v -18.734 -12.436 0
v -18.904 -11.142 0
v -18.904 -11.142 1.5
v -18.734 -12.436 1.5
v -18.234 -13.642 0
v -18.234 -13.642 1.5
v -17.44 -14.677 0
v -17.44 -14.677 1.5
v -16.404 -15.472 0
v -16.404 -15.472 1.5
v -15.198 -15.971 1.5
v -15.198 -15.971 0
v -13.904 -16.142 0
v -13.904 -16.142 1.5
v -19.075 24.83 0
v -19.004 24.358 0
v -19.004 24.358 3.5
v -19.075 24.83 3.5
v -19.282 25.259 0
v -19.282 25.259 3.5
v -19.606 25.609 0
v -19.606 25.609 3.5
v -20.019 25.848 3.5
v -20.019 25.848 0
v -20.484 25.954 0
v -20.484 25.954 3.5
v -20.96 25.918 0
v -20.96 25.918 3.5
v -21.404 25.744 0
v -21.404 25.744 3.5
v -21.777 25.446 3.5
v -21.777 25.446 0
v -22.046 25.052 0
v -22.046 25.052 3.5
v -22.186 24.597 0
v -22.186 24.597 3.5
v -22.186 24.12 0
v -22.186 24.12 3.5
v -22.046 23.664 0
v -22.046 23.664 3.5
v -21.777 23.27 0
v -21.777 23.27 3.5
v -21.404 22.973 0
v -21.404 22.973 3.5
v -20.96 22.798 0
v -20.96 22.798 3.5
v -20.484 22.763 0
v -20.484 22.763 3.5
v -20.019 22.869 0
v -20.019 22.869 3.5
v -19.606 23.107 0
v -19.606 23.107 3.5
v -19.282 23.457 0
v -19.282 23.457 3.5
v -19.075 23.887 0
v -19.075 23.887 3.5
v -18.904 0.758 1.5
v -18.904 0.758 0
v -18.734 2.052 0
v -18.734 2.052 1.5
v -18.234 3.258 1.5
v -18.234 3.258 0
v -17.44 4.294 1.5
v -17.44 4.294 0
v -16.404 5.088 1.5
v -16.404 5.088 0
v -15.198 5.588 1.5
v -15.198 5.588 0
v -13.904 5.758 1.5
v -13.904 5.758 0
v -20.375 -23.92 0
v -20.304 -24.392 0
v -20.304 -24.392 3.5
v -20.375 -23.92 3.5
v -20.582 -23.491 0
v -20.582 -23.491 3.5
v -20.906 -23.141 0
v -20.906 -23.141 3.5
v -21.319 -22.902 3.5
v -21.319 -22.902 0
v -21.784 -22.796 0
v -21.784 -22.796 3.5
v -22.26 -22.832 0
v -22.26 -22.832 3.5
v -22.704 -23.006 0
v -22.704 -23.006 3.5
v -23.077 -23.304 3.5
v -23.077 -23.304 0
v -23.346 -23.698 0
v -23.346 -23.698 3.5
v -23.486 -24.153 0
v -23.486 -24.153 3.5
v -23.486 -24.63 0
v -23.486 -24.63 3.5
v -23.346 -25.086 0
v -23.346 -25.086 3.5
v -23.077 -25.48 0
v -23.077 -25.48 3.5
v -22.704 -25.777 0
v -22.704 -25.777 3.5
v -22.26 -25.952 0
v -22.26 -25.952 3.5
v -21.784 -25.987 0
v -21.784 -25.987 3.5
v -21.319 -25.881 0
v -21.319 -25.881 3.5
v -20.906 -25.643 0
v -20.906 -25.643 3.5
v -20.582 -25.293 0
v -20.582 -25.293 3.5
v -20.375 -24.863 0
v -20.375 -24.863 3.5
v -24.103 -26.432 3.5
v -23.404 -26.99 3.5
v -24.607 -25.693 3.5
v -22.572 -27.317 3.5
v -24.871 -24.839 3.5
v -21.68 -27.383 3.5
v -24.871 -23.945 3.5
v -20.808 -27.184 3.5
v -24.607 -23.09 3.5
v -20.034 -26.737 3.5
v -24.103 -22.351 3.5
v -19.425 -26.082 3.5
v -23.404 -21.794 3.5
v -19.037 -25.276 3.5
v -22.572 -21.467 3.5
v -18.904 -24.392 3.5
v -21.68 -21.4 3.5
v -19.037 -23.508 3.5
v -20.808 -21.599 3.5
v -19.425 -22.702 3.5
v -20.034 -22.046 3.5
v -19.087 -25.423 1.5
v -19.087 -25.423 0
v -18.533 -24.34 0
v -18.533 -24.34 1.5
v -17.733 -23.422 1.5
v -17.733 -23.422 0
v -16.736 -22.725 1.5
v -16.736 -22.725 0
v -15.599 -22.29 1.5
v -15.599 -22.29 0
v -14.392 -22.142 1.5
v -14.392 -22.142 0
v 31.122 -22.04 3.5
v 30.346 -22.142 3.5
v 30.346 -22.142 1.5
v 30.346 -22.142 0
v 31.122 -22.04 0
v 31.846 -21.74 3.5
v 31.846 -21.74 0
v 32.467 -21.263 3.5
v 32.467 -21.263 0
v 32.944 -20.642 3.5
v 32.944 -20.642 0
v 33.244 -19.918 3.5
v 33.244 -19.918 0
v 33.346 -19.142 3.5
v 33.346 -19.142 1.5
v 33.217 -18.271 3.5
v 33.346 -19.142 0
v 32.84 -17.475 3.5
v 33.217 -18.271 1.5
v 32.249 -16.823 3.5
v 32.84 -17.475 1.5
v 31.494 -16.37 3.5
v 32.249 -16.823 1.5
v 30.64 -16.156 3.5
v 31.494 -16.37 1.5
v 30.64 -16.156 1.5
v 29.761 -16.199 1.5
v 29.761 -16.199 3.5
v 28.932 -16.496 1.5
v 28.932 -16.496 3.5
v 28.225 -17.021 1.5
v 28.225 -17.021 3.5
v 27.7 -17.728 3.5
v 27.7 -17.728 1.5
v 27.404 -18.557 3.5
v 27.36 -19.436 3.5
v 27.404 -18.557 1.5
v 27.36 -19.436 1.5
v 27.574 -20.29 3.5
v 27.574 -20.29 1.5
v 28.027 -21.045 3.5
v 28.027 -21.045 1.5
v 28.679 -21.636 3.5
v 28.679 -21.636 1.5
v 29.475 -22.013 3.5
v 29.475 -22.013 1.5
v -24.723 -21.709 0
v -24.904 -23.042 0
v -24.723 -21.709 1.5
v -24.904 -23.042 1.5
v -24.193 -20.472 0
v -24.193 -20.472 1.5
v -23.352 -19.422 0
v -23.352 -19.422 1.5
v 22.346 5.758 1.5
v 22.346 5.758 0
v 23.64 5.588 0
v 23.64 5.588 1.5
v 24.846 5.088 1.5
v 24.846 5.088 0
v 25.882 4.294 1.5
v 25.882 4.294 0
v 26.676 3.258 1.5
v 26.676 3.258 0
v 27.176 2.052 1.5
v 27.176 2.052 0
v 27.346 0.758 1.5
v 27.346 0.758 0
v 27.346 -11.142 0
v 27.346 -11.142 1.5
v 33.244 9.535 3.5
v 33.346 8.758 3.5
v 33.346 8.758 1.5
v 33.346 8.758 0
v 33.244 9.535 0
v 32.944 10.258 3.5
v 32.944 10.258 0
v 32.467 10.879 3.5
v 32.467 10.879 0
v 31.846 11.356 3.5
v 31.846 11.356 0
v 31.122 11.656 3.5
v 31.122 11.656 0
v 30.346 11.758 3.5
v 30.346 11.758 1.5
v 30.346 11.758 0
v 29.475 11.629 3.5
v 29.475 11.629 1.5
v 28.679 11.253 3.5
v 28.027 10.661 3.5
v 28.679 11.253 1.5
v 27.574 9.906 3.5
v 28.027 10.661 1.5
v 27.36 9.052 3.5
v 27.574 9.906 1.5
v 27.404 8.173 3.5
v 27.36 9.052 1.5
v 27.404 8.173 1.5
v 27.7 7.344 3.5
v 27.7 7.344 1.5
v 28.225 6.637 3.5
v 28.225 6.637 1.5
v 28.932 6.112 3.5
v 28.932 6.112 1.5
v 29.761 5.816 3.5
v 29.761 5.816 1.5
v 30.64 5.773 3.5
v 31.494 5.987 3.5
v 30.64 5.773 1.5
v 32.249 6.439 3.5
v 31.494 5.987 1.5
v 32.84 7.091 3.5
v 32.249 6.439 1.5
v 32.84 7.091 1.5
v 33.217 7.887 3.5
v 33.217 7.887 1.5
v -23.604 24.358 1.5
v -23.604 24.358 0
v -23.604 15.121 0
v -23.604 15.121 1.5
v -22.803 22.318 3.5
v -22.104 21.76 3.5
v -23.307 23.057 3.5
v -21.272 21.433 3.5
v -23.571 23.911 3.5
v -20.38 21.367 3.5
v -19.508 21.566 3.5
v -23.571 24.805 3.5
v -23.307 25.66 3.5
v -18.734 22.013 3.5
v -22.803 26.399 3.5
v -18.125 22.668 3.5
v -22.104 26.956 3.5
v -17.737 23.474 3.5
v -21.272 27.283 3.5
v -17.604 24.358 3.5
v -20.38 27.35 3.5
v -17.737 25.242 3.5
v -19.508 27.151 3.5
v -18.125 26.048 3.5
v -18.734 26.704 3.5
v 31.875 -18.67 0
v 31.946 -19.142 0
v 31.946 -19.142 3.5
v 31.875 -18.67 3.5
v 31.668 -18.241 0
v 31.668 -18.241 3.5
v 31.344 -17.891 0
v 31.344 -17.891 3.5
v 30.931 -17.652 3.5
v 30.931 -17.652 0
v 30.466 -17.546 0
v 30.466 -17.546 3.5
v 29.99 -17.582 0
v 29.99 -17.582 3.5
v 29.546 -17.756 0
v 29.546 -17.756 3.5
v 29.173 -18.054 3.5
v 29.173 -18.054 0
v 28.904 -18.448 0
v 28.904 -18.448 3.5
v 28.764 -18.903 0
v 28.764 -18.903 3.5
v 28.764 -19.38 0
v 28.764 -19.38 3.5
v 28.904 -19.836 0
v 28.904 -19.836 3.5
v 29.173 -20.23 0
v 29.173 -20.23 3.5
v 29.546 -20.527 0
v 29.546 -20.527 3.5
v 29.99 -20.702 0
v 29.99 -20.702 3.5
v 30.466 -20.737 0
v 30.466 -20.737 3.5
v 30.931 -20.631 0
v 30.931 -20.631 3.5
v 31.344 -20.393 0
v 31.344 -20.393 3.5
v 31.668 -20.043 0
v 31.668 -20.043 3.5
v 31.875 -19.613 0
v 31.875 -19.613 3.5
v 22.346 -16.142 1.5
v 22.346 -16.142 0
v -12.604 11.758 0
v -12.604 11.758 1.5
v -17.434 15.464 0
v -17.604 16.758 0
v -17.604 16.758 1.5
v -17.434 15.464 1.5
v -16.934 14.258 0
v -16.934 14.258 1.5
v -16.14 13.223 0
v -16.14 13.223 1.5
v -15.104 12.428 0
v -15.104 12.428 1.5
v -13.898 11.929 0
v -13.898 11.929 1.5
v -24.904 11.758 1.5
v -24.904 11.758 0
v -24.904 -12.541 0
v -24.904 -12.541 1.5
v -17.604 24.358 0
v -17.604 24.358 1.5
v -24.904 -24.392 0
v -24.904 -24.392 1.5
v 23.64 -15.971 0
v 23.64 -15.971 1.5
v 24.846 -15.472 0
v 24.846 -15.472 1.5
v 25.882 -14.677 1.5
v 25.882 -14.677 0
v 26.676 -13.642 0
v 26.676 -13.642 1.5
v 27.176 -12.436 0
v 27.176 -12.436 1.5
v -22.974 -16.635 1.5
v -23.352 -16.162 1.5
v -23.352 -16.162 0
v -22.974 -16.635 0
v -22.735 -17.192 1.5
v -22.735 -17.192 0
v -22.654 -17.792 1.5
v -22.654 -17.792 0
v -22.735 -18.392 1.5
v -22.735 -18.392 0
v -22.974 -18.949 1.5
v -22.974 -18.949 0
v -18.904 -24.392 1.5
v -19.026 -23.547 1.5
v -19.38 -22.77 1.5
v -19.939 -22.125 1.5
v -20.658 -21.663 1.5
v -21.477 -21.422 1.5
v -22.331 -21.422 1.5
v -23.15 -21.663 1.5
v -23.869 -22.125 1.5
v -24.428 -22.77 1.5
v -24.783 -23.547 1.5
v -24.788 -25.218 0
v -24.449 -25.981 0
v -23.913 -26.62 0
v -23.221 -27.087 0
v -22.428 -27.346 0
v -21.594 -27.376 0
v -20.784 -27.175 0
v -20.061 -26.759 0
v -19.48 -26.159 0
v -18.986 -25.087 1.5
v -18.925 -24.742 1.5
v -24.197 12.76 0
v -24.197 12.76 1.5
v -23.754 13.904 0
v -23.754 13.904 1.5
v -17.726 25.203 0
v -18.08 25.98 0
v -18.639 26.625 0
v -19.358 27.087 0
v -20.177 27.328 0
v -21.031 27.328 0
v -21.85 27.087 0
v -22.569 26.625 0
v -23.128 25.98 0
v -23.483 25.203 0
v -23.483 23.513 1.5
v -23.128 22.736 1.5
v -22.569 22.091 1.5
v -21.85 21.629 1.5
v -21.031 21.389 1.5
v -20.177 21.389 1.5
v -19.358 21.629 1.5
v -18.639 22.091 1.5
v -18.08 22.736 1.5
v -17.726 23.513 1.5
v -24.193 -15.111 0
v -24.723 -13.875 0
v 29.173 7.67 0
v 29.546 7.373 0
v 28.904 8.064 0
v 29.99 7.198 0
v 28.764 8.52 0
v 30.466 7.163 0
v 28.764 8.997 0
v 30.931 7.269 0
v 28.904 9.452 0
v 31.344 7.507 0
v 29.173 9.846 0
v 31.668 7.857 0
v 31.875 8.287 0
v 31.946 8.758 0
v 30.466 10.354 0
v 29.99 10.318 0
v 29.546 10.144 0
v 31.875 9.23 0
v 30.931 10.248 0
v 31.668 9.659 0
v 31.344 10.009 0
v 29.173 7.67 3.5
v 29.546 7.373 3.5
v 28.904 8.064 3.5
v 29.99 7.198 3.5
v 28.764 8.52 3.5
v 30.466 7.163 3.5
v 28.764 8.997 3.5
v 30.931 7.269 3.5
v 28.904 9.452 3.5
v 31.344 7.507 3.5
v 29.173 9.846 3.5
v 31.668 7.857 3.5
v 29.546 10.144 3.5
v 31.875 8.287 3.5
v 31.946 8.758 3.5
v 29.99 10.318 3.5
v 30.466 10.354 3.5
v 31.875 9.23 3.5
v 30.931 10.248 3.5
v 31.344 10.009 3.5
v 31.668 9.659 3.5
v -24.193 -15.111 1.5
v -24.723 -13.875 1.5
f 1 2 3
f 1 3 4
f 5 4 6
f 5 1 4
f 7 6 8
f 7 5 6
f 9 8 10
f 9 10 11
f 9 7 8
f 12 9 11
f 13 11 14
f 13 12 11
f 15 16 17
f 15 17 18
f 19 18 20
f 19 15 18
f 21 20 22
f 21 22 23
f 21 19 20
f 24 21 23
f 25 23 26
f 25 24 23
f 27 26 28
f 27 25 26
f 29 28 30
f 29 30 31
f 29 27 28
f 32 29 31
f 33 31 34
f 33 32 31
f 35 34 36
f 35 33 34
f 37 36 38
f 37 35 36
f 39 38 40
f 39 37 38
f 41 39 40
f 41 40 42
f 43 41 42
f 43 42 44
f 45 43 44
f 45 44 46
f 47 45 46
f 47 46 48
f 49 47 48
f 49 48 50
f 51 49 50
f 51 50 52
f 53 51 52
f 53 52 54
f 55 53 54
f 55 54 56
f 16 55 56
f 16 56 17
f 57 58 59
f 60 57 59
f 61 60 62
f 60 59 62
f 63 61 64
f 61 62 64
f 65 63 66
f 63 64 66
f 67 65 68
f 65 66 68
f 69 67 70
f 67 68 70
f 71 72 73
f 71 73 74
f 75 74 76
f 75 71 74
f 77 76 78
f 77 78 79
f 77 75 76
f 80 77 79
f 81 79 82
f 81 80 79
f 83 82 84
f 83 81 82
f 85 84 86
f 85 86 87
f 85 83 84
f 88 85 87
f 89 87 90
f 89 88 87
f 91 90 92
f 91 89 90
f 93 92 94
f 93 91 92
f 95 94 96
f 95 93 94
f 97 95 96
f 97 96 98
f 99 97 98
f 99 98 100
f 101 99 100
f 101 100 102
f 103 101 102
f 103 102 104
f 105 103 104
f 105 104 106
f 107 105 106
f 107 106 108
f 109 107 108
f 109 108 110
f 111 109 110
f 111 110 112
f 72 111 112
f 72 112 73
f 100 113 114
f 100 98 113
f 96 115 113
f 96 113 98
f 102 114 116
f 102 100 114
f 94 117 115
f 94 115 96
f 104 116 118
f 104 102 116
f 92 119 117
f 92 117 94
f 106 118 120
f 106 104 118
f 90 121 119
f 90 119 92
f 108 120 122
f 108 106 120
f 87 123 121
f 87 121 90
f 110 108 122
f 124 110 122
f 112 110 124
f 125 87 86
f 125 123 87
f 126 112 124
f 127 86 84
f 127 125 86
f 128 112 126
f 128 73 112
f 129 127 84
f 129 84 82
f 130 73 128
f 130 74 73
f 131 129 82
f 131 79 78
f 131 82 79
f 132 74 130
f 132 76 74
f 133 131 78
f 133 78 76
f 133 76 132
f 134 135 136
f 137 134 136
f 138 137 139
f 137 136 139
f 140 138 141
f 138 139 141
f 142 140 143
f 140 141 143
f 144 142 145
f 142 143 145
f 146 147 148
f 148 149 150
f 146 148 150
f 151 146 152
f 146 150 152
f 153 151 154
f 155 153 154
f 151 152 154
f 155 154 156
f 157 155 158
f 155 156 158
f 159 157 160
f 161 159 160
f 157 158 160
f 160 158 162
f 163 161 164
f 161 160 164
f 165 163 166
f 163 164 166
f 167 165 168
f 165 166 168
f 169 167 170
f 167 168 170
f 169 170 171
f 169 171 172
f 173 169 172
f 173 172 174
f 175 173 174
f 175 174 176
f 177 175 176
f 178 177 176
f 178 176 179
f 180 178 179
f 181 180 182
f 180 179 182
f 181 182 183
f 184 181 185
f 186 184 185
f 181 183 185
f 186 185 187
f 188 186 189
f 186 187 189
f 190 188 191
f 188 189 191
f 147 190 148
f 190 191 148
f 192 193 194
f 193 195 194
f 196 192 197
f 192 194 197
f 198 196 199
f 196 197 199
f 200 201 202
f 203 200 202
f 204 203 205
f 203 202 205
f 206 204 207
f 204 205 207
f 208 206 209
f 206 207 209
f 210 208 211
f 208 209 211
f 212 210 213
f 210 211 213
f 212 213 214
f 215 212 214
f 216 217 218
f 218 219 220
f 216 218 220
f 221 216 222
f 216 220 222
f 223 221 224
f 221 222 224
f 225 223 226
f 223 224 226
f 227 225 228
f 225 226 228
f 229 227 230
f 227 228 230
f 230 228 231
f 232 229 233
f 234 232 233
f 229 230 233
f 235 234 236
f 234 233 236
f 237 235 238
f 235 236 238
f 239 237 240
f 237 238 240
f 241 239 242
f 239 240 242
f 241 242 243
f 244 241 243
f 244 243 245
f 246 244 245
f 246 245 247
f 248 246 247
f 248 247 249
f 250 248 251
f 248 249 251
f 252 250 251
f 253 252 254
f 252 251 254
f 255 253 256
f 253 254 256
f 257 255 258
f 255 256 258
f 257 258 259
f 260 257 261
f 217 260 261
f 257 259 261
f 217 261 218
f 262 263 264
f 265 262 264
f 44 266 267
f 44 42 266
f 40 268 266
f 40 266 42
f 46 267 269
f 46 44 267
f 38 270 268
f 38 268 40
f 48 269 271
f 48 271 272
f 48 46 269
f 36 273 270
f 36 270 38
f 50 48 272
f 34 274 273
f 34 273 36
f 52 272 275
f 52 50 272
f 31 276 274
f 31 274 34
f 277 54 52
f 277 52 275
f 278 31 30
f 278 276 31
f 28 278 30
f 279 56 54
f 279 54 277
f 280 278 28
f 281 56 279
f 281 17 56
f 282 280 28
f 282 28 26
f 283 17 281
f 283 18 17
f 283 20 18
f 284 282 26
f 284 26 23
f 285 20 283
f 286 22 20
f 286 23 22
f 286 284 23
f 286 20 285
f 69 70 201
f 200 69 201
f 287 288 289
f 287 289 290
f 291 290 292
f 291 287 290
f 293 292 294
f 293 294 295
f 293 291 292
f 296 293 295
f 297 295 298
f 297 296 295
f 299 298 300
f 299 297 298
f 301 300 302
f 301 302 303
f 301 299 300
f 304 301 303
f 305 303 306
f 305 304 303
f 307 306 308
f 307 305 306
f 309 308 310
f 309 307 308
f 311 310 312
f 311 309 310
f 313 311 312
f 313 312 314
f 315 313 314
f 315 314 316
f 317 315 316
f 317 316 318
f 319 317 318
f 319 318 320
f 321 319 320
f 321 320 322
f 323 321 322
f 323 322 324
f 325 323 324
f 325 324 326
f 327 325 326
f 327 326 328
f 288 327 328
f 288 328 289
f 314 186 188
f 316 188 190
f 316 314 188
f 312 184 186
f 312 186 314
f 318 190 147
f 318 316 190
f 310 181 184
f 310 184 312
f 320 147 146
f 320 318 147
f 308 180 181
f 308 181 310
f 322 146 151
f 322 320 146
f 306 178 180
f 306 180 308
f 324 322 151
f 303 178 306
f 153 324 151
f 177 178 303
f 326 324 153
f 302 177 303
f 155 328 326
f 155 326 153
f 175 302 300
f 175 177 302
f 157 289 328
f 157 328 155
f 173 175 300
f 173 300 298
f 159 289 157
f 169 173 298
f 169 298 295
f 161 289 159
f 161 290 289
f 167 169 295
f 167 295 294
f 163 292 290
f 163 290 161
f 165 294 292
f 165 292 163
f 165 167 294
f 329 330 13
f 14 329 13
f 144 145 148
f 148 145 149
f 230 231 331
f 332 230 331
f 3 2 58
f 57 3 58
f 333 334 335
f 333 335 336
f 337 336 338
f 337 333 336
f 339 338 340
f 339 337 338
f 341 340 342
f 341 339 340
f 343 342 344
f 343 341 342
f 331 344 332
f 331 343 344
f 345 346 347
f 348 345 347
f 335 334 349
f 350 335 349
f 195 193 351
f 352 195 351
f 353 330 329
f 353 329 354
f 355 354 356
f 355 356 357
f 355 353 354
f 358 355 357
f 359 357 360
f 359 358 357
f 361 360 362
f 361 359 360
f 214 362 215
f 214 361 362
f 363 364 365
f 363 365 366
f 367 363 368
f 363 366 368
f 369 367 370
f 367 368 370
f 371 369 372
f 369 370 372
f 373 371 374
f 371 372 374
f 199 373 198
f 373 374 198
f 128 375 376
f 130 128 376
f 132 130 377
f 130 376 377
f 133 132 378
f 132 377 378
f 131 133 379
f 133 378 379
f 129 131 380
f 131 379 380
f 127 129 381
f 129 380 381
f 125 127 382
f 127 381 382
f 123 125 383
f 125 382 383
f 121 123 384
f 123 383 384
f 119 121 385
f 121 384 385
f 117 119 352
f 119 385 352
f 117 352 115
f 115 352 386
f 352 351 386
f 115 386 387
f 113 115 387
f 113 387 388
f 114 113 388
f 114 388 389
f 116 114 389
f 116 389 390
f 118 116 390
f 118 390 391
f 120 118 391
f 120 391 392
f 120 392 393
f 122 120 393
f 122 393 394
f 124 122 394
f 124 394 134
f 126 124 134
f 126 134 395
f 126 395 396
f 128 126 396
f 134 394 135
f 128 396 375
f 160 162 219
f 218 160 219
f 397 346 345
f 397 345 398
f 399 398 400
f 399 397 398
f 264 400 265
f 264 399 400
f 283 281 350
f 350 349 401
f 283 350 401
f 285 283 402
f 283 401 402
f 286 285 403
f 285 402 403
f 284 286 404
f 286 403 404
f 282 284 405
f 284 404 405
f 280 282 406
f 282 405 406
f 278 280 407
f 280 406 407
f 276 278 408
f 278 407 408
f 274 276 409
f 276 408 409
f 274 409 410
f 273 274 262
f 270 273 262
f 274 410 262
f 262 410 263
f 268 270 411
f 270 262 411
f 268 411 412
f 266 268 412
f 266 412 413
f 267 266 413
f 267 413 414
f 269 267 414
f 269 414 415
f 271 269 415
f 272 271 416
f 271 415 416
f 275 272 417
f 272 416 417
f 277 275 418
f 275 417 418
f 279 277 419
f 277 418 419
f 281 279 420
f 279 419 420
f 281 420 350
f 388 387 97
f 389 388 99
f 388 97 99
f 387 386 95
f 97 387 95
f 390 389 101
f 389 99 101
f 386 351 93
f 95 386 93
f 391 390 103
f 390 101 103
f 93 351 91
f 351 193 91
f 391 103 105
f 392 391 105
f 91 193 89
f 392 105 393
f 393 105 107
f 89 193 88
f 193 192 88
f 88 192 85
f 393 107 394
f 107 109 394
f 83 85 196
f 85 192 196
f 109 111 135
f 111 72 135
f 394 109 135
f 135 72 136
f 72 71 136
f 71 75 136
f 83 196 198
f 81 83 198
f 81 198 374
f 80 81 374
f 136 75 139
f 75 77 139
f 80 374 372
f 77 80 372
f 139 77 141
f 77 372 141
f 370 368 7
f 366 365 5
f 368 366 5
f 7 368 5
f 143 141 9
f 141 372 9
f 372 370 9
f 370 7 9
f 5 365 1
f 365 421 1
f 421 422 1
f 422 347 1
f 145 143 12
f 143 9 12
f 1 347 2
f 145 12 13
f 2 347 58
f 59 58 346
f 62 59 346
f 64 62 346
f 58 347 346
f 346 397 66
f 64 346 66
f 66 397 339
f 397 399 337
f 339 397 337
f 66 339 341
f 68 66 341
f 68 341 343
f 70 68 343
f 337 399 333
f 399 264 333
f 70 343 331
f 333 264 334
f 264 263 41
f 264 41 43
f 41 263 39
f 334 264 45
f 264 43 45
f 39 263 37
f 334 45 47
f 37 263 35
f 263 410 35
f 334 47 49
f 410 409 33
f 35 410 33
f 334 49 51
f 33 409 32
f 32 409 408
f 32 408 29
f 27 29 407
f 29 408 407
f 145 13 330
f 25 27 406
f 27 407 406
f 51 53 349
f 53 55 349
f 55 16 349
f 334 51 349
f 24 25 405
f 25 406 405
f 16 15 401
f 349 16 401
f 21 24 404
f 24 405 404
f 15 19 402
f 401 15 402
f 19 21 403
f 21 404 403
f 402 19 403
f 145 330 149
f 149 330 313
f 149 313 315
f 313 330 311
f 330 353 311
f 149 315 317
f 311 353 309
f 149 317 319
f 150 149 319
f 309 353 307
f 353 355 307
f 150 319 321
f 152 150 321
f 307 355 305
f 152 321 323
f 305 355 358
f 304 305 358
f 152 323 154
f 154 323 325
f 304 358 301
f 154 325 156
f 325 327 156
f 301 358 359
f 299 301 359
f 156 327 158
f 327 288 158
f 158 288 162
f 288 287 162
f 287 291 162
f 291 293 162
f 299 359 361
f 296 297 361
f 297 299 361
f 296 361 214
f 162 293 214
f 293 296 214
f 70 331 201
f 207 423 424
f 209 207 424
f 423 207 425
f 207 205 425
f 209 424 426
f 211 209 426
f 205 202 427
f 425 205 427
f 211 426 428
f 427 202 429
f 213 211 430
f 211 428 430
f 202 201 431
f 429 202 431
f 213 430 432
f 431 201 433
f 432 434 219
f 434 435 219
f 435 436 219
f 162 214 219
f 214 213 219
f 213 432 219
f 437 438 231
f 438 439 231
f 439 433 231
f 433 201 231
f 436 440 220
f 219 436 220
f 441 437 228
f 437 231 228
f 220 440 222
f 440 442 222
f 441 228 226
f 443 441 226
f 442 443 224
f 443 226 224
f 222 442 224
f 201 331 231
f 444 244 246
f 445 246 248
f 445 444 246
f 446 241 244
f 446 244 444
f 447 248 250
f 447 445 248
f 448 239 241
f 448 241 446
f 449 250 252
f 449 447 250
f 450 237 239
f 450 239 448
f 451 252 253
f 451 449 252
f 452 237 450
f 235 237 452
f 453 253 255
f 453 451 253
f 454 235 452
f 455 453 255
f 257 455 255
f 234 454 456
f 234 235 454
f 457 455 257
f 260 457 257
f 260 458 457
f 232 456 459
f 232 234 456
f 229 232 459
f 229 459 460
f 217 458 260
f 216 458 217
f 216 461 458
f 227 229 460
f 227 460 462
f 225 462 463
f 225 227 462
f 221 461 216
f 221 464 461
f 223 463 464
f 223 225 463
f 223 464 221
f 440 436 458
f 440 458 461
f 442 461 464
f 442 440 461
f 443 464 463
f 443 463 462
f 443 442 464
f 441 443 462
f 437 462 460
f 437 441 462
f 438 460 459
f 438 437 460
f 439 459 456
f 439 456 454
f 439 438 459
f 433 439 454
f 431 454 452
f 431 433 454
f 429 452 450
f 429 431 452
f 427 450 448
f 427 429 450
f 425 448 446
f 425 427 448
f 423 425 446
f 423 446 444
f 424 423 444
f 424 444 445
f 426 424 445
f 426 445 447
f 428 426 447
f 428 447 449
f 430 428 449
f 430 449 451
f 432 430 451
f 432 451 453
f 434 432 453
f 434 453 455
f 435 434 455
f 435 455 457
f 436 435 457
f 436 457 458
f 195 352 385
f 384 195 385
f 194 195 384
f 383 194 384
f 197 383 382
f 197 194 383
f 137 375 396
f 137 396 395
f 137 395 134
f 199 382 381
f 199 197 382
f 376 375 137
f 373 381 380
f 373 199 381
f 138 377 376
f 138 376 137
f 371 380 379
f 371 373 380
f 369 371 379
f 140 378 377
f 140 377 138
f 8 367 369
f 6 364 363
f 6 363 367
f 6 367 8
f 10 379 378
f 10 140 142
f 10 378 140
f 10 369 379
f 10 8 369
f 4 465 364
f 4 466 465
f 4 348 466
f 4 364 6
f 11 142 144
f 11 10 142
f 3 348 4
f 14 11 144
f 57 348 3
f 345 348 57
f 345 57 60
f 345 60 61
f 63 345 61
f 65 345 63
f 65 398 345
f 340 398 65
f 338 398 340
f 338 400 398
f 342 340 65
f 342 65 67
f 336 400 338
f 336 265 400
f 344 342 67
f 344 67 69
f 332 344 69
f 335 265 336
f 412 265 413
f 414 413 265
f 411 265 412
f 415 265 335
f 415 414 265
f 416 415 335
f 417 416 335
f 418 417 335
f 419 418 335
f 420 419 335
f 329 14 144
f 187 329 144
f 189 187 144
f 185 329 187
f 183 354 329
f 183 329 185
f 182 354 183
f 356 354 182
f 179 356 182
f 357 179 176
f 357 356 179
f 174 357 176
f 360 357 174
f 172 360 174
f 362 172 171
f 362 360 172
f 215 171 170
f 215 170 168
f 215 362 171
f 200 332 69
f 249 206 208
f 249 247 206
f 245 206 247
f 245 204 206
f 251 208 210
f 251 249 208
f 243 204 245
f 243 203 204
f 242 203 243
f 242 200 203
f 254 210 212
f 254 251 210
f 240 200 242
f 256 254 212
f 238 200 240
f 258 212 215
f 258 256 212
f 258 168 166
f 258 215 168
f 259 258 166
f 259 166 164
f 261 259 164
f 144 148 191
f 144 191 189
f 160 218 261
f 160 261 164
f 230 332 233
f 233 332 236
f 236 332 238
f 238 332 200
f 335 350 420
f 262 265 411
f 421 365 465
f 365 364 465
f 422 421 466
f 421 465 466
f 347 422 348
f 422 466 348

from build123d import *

# Parameters (mm, degrees)
F0_R        = 1.6
F1_DEPTH    = 1.5
F2_DEPTH    = 3.5
F3_T1_DEPTH = 1.5
F4_R        = 5


# Not quite as in the source:
# - a fillet or chamfer that OpenCascade refuses, or shapes differently, is made with other operations: its cross-section is extruded or revolved along the edge and cut away or added
# - a feature names something its author has since deleted; it is built from what else it names


with BuildPart() as f1:
    # F0 (on Top) → F1 (new body)
    with BuildSketch(Plane.XY):
        with BuildLine():
            Line((-18.9040250808, 5.7581766099), (-18.9040250808, 11.7581766099))
            Line((-18.9040250808, 11.7581766099), (-23.6040250808, 11.7581766099))
            Line((-23.6040250808, 11.7581766099), (-24.9040250808, 11.7581766099))
            Line((-24.9040250808, 11.7581766099), (-24.9040250808, -15.541421883))
            ThreePointArc((-24.9040250808, -15.541421883), (-22.6536235737, -17.7918233901), (-24.9040250808, -20.0422248973))
            Line((-24.9040250808, -20.0422248973), (-24.9040250808, -24.3918233901))
            ThreePointArc((-24.9040250808, -24.3918233901), (-21.9040250808, -21.3918233901), (-18.9040250808, -24.3918233901))
            Line((-18.9040250808, -24.3918233901), (-18.9040250808, -22.1418233901))
            Line((-18.9040250808, -22.1418233901), (-18.9040250808, -16.1418233901))
            Line((-18.9040250808, -16.1418233901), (-18.9040250808, 5.7581766099))
        make_face()
        with BuildLine():
            ThreePointArc((33.3459749192, 8.7581766099), (28.2246545756, 6.6368562663), (30.3459749192, 11.7581766099))
            Line((30.3459749192, 11.7581766099), (-17.6040250808, 11.7581766099))
            Line((-17.6040250808, 11.7581766099), (-18.9040250808, 11.7581766099))
            Line((-18.9040250808, 11.7581766099), (-18.9040250808, 5.7581766099))
            Line((-18.9040250808, 5.7581766099), (27.3459749192, 5.7581766099))
            Line((27.3459749192, 5.7581766099), (27.3459749192, -16.1418233901))
            Line((27.3459749192, -16.1418233901), (-18.9040250808, -16.1418233901))
            Line((-18.9040250808, -16.1418233901), (-18.9040250808, -22.1418233901))
            Line((-18.9040250808, -22.1418233901), (30.3459749192, -22.1418233901))
            ThreePointArc((30.3459749192, -22.1418233901), (28.2246545756, -17.0205030466), (33.3459749192, -19.1418233901))
            Line((33.3459749192, -19.1418233901), (33.3459749192, 8.7581766099))
        make_face()
        with BuildLine():
            ThreePointArc((-24.9040250808, -24.3918233901), (-21.9040250808, -27.3918233901), (-18.9040250808, -24.3918233901))
            ThreePointArc((-18.9040250808, -24.3918233901), (-21.9040250808, -21.3918233901), (-24.9040250808, -24.3918233901))
        make_face()
        with Locations((-21.9040250808, -24.3918233901)):
            Circle(F0_R, mode=Mode.SUBTRACT)
        with BuildLine():
            ThreePointArc((30.3459749192, -22.1418233901), (32.4672952628, -21.2631437337), (33.3459749192, -19.1418233901))
            ThreePointArc((33.3459749192, -19.1418233901), (28.2246545756, -17.0205030466), (30.3459749192, -22.1418233901))
        make_face()
        with Locations((30.3459749192, -19.1418233901)):
            Circle(F0_R, mode=Mode.SUBTRACT)
        with BuildLine():
            ThreePointArc((33.3459749192, 8.7581766099), (32.4672952628, 10.8794969534), (30.3459749192, 11.7581766099))
            ThreePointArc((30.3459749192, 11.7581766099), (28.2246545756, 6.6368562663), (33.3459749192, 8.7581766099))
        make_face()
        with Locations((30.3459749192, 8.7581766099)):
            Circle(F0_R, mode=Mode.SUBTRACT)
        with BuildLine():
            Line((-18.9040250808, 11.7581766099), (-17.6040250808, 11.7581766099))
            Line((-17.6040250808, 11.7581766099), (-17.6040250808, 24.3581766099))
            ThreePointArc((-17.6040250808, 24.3581766099), (-20.6040250808, 21.3581766099), (-23.6040250808, 24.3581766099))
            Line((-23.6040250808, 24.3581766099), (-23.6040250808, 11.7581766099))
            Line((-23.6040250808, 11.7581766099), (-18.9040250808, 11.7581766099))
        make_face()
        with BuildLine():
            ThreePointArc((-23.6040250808, 24.3581766099), (-20.6040250808, 21.3581766099), (-17.6040250808, 24.3581766099))
            ThreePointArc((-17.6040250808, 24.3581766099), (-20.6040250808, 27.3581766099), (-23.6040250808, 24.3581766099))
        make_face()
        with Locations((-20.6040250808, 24.3581766099)):
            Circle(F0_R, mode=Mode.SUBTRACT)
    extrude(amount=F1_DEPTH)

    # F0 (on Top) → F2 (join)
    with BuildSketch(Plane.XY):
        with BuildLine():
            ThreePointArc((-24.9040250808, -24.3918233901), (-21.9040250808, -27.3918233901), (-18.9040250808, -24.3918233901))
            ThreePointArc((-18.9040250808, -24.3918233901), (-21.9040250808, -21.3918233901), (-24.9040250808, -24.3918233901))
        make_face()
        with Locations((-21.9040250808, -24.3918233901)):
            Circle(F0_R, mode=Mode.SUBTRACT)
        with BuildLine():
            ThreePointArc((33.3459749192, 8.7581766099), (32.4672952628, 10.8794969534), (30.3459749192, 11.7581766099))
            ThreePointArc((30.3459749192, 11.7581766099), (28.2246545756, 6.6368562663), (33.3459749192, 8.7581766099))
        make_face()
        with Locations((30.3459749192, 8.7581766099)):
            Circle(F0_R, mode=Mode.SUBTRACT)
        with BuildLine():
            ThreePointArc((30.3459749192, -22.1418233901), (32.4672952628, -21.2631437337), (33.3459749192, -19.1418233901))
            ThreePointArc((33.3459749192, -19.1418233901), (28.2246545756, -17.0205030466), (30.3459749192, -22.1418233901))
        make_face()
        with Locations((30.3459749192, -19.1418233901)):
            Circle(F0_R, mode=Mode.SUBTRACT)
        with BuildLine():
            ThreePointArc((-23.6040250808, 24.3581766099), (-20.6040250808, 21.3581766099), (-17.6040250808, 24.3581766099))
            ThreePointArc((-17.6040250808, 24.3581766099), (-20.6040250808, 27.3581766099), (-23.6040250808, 24.3581766099))
        make_face()
        with Locations((-20.6040250808, 24.3581766099)):
            Circle(F0_R, mode=Mode.SUBTRACT)
    extrude(amount=F2_DEPTH)

    # F3: fillet of radius 5 on 7 edges, made by hand

    # F3_s2 → F3_t1 (join)
    with BuildSketch(Plane.XY):
        with BuildLine():
            ThreePointArc((-18.9040250808, 0.7581766099), (-17.4395589867, 4.2937105158), (-13.9040250808, 5.7581766099))
            Line((-13.9040250808, 5.7581766099), (-18.9040250808, 5.7581766099))
            Line((-18.9040250808, 5.7581766099), (-18.9040250808, 0.7581766099))
        make_face()
        with BuildLine():
            ThreePointArc((-18.9040250808, -11.1418233901), (-17.4395589867, -14.6773572961), (-13.9040250808, -16.1418233901))
            Line((-13.9040250808, -16.1418233901), (-18.9040250808, -16.1418233901))
            Line((-18.9040250808, -16.1418233901), (-18.9040250808, -11.1418233901))
        make_face()
        with BuildLine():
            ThreePointArc((22.3459749192, 5.7581766099), (25.8815088251, 4.2937105158), (27.3459749192, 0.7581766099))
            Line((27.3459749192, 0.7581766099), (27.3459749192, 5.7581766099))
            Line((27.3459749192, 5.7581766099), (22.3459749192, 5.7581766099))
        make_face()
        with BuildLine():
            ThreePointArc((22.3459749192, -16.1418233901), (25.8815088251, -14.6773572961), (27.3459749192, -11.1418233901))
            Line((27.3459749192, -11.1418233901), (27.3459749192, -16.1418233901))
            Line((27.3459749192, -16.1418233901), (22.3459749192, -16.1418233901))
        make_face()
        with BuildLine():
            ThreePointArc((-17.6040250808, 16.7581766099), (-16.1395589867, 13.2226427039), (-12.6040250808, 11.7581766099))
            Line((-12.6040250808, 11.7581766099), (-17.6040250808, 11.7581766099))
            Line((-17.6040250808, 11.7581766099), (-17.6040250808, 16.7581766099))
        make_face()
        with BuildLine():
            ThreePointArc((-24.9040250808, 11.7581766099), (-23.9403355543, 13.3184353163), (-23.6040250808, 15.121210954))
            Line((-23.6040250808, 15.121210954), (-23.6040250808, 11.7581766099))
            Line((-23.6040250808, 11.7581766099), (-24.9040250808, 11.7581766099))
        make_face()
        with BuildLine():
            ThreePointArc((-19.0868414806, -25.4230733901), (-17.2556452895, -23.0434243124), (-14.3915354801, -22.1418233901))
            Line((-14.3915354801, -22.1418233901), (-14.3915354801, -21.6418233901))
            Line((-14.3915354801, -21.6418233901), (-18.9040250808, -21.6418233901))
            Line((-18.9040250808, -21.6418233901), (-19.4040250808, -22.1418233901))
            ThreePointArc((-19.4040250808, -22.1418233901), (-19.4040250808, -24.3918233901), (-19.5563720806, -25.2511983901))
            Line((-19.5563720806, -25.2511983901), (-19.0868414806, -25.4230733901))
        make_face()
    extrude(amount=F3_T1_DEPTH)

    # F4
    f4_edges = [f1.edges().sort_by_distance(p)[0] for p in [
        (-24.904025, -15.541422, 0.75),
        (-24.904025, -20.042225, 0.75),
    ]]
    fillet(f4_edges, radius=F4_R)


solid = f1.part
